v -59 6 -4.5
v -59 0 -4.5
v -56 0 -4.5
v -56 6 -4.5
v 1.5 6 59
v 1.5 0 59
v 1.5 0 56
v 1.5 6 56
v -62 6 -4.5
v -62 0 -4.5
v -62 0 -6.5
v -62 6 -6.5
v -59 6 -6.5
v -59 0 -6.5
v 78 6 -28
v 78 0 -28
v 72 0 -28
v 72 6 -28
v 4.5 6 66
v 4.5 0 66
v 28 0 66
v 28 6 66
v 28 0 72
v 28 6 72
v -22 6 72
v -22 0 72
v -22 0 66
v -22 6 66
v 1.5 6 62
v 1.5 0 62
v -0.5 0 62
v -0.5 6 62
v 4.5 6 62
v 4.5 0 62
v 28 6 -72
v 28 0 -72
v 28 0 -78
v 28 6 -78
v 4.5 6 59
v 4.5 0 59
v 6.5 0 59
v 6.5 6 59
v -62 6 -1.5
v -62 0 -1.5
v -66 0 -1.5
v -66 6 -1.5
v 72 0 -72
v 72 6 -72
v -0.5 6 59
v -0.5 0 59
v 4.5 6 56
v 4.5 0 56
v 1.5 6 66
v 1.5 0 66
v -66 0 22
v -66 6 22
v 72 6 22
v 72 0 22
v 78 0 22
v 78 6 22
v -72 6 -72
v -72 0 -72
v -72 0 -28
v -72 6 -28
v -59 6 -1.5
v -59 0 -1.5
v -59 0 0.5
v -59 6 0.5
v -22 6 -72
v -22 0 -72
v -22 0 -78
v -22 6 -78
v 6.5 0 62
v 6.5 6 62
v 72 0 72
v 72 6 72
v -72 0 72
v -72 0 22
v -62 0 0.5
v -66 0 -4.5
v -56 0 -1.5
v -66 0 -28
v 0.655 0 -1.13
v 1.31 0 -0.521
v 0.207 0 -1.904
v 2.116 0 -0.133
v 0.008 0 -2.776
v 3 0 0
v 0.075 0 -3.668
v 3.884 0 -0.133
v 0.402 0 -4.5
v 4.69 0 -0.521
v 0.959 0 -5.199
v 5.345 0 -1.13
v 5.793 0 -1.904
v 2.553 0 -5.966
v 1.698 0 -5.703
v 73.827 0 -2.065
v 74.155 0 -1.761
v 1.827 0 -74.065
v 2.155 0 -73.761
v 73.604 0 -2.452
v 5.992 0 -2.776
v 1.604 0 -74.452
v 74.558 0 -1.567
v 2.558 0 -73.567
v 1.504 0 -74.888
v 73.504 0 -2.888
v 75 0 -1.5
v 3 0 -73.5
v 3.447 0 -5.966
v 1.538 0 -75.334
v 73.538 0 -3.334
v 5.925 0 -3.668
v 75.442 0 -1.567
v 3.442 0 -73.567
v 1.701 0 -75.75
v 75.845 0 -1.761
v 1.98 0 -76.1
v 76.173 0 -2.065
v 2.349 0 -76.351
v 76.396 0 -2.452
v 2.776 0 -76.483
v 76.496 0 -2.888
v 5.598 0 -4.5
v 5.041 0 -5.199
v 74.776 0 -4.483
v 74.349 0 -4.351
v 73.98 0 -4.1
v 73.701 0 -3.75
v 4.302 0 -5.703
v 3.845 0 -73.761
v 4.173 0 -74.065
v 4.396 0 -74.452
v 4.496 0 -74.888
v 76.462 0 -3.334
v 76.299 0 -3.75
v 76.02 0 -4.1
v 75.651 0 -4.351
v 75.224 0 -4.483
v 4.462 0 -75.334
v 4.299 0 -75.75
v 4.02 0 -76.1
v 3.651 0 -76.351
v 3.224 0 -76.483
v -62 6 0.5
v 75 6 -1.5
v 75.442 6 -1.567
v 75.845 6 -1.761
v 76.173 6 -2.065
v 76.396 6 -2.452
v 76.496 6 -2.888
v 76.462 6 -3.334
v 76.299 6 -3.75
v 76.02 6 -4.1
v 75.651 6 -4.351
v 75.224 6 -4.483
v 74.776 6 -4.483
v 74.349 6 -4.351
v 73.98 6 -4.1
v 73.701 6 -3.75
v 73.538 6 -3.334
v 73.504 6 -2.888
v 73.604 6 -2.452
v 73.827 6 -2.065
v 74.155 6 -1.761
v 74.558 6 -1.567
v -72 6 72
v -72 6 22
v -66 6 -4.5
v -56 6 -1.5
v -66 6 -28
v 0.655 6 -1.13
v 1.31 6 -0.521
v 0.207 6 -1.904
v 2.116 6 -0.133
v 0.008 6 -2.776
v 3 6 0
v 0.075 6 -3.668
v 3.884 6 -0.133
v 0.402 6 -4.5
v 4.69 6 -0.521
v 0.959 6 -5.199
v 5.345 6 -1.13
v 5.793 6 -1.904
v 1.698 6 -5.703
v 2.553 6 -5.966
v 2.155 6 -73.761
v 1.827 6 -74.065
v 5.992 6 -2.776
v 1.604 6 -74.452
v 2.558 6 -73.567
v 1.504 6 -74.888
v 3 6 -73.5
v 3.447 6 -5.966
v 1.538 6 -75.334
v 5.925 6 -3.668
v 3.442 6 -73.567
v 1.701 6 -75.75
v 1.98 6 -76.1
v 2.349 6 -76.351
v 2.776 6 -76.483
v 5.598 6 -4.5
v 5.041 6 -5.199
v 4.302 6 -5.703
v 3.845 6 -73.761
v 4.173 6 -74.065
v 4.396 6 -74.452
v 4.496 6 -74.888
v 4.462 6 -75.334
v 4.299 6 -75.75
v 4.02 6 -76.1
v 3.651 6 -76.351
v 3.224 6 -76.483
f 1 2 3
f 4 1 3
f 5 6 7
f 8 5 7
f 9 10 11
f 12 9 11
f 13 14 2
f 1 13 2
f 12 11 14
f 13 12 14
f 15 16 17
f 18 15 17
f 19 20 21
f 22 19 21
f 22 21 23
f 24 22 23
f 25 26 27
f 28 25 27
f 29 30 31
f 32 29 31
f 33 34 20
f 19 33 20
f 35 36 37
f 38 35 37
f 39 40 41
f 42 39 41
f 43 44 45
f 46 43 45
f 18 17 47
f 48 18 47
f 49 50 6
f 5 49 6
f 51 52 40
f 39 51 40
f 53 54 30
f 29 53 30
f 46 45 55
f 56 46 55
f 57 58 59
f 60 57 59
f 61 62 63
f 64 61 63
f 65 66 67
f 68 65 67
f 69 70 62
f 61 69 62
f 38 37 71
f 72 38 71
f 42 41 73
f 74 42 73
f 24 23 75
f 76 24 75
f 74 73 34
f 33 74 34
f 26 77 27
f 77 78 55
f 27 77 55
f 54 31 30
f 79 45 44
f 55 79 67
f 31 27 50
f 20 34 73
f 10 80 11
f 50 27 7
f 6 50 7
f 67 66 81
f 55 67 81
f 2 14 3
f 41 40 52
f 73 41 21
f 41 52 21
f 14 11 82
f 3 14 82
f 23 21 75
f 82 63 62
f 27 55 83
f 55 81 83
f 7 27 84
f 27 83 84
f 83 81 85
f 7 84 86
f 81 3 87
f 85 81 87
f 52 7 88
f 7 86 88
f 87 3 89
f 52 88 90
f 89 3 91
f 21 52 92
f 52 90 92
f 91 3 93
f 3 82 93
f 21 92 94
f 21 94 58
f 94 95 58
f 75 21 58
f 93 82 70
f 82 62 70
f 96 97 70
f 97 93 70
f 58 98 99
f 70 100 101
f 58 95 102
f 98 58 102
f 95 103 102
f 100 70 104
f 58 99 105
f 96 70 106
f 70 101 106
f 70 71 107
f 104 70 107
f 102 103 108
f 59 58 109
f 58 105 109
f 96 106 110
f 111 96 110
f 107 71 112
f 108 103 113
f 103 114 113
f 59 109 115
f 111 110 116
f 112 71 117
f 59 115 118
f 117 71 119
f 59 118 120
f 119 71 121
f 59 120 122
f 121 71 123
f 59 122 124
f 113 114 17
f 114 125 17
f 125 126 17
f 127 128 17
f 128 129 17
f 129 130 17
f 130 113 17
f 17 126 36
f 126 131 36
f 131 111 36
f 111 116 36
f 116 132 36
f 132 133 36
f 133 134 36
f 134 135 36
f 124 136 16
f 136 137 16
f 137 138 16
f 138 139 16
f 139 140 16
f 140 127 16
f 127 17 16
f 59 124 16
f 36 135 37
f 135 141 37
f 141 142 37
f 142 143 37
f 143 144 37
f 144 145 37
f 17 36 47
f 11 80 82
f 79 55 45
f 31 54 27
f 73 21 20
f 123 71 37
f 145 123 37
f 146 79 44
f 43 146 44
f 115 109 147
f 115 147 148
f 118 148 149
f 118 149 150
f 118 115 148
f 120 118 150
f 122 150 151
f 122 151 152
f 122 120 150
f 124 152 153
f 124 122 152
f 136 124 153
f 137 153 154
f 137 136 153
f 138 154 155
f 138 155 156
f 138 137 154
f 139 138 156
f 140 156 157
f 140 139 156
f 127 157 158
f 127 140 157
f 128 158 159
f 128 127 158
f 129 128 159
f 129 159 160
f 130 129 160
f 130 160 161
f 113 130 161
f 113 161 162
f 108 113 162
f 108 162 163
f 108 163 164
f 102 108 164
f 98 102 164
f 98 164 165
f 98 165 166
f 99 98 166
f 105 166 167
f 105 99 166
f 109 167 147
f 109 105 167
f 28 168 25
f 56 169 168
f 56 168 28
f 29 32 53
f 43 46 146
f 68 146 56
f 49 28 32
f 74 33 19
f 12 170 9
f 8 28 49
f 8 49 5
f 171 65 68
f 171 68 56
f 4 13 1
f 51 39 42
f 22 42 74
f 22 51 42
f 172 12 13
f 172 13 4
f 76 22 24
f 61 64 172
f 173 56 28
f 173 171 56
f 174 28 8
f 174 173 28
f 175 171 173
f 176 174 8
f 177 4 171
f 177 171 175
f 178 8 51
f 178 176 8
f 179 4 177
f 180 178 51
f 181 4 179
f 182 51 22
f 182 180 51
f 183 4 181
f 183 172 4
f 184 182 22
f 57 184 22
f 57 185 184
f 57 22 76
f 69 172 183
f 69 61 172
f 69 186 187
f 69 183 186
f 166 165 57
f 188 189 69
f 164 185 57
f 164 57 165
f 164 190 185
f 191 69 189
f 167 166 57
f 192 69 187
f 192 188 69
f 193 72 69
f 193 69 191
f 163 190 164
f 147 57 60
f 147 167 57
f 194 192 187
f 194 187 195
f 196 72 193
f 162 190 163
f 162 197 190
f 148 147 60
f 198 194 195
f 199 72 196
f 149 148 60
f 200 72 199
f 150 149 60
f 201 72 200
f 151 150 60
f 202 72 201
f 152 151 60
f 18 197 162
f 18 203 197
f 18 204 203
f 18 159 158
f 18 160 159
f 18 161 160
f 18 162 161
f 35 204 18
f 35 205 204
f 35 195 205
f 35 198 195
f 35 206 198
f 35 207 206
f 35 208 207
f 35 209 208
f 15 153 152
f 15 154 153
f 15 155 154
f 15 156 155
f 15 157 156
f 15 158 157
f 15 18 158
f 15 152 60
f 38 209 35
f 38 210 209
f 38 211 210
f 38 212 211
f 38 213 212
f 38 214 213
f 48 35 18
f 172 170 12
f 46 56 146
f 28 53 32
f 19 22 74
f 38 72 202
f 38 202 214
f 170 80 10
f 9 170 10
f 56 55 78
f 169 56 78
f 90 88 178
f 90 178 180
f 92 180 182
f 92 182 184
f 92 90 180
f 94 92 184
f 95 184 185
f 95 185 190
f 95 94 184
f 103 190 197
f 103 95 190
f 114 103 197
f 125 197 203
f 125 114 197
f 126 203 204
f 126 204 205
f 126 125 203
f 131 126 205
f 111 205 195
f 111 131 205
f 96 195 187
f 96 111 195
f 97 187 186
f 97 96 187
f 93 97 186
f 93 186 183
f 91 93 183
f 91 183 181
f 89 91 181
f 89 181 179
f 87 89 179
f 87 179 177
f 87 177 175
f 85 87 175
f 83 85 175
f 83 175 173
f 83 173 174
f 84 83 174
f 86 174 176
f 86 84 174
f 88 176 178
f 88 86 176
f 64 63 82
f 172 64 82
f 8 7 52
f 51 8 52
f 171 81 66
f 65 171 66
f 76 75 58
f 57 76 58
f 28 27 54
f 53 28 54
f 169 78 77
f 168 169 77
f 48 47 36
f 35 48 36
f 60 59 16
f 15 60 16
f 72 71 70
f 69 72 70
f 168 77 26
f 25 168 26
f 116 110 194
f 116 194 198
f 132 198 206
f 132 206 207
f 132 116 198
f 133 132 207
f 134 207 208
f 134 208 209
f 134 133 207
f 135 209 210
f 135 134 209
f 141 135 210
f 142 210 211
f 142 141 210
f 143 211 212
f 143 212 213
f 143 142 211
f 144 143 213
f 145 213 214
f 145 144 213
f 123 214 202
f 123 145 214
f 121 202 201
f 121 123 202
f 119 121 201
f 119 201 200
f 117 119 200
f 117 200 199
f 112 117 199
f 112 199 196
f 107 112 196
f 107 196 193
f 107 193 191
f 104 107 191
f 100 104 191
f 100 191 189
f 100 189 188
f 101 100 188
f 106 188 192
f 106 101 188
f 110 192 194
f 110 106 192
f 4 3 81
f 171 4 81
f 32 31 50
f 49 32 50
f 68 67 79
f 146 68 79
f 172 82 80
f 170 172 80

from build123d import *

# Parameters (mm, degrees)
SKETCH1_R           = 3
SKETCH1_R_2         = 1.5
BOSS_EXTRUDE1_DEPTH = 6


with BuildPart() as part:
    # Sketch1 → Boss-Extrude1 (new body)
    with BuildSketch(Plane(origin=(0, 0, 0), x_dir=(1, 0, 0), z_dir=(0, 1, 0))):
        Polygon((-72, 72), (-72, 28), (-66, 28), (-66, 4.5), (-62, 4.5), (-62, 6.5), (-59, 6.5), (-59, 4.5), (-56, 4.5), (-56, 1.5), (-59, 1.5), (-59, -0.5), (-62, -0.5), (-62, 1.5), (-66, 1.5), (-66, -22), (-72, -22), (-72, -72), (-22, -72), (-22, -66), (1.5, -66), (1.5, -62), (-0.5, -62), (-0.5, -59), (1.5, -59), (1.5, -56), (4.5, -56), (4.5, -59), (6.5, -59), (6.5, -62), (4.5, -62), (4.5, -66), (28, -66), (28, -72), (72, -72), (72, -22), (78, -22), (78, 28), (72, 28), (72, 72), (28, 72), (28, 78), (-22, 78), (-22, 72), align=None)
        with Locations(Location((3, 3, 0), (0, 0, 270))):
            Circle(SKETCH1_R, mode=Mode.SUBTRACT)
        with Locations(Location((3, 75, 0), (0, 0, 270))):
            Circle(SKETCH1_R_2, mode=Mode.SUBTRACT)
        with Locations(Location((75, 3, 0), (0, 0, 270))):
            Circle(SKETCH1_R_2, mode=Mode.SUBTRACT)
    extrude(amount=BOSS_EXTRUDE1_DEPTH)


solid = part.part
